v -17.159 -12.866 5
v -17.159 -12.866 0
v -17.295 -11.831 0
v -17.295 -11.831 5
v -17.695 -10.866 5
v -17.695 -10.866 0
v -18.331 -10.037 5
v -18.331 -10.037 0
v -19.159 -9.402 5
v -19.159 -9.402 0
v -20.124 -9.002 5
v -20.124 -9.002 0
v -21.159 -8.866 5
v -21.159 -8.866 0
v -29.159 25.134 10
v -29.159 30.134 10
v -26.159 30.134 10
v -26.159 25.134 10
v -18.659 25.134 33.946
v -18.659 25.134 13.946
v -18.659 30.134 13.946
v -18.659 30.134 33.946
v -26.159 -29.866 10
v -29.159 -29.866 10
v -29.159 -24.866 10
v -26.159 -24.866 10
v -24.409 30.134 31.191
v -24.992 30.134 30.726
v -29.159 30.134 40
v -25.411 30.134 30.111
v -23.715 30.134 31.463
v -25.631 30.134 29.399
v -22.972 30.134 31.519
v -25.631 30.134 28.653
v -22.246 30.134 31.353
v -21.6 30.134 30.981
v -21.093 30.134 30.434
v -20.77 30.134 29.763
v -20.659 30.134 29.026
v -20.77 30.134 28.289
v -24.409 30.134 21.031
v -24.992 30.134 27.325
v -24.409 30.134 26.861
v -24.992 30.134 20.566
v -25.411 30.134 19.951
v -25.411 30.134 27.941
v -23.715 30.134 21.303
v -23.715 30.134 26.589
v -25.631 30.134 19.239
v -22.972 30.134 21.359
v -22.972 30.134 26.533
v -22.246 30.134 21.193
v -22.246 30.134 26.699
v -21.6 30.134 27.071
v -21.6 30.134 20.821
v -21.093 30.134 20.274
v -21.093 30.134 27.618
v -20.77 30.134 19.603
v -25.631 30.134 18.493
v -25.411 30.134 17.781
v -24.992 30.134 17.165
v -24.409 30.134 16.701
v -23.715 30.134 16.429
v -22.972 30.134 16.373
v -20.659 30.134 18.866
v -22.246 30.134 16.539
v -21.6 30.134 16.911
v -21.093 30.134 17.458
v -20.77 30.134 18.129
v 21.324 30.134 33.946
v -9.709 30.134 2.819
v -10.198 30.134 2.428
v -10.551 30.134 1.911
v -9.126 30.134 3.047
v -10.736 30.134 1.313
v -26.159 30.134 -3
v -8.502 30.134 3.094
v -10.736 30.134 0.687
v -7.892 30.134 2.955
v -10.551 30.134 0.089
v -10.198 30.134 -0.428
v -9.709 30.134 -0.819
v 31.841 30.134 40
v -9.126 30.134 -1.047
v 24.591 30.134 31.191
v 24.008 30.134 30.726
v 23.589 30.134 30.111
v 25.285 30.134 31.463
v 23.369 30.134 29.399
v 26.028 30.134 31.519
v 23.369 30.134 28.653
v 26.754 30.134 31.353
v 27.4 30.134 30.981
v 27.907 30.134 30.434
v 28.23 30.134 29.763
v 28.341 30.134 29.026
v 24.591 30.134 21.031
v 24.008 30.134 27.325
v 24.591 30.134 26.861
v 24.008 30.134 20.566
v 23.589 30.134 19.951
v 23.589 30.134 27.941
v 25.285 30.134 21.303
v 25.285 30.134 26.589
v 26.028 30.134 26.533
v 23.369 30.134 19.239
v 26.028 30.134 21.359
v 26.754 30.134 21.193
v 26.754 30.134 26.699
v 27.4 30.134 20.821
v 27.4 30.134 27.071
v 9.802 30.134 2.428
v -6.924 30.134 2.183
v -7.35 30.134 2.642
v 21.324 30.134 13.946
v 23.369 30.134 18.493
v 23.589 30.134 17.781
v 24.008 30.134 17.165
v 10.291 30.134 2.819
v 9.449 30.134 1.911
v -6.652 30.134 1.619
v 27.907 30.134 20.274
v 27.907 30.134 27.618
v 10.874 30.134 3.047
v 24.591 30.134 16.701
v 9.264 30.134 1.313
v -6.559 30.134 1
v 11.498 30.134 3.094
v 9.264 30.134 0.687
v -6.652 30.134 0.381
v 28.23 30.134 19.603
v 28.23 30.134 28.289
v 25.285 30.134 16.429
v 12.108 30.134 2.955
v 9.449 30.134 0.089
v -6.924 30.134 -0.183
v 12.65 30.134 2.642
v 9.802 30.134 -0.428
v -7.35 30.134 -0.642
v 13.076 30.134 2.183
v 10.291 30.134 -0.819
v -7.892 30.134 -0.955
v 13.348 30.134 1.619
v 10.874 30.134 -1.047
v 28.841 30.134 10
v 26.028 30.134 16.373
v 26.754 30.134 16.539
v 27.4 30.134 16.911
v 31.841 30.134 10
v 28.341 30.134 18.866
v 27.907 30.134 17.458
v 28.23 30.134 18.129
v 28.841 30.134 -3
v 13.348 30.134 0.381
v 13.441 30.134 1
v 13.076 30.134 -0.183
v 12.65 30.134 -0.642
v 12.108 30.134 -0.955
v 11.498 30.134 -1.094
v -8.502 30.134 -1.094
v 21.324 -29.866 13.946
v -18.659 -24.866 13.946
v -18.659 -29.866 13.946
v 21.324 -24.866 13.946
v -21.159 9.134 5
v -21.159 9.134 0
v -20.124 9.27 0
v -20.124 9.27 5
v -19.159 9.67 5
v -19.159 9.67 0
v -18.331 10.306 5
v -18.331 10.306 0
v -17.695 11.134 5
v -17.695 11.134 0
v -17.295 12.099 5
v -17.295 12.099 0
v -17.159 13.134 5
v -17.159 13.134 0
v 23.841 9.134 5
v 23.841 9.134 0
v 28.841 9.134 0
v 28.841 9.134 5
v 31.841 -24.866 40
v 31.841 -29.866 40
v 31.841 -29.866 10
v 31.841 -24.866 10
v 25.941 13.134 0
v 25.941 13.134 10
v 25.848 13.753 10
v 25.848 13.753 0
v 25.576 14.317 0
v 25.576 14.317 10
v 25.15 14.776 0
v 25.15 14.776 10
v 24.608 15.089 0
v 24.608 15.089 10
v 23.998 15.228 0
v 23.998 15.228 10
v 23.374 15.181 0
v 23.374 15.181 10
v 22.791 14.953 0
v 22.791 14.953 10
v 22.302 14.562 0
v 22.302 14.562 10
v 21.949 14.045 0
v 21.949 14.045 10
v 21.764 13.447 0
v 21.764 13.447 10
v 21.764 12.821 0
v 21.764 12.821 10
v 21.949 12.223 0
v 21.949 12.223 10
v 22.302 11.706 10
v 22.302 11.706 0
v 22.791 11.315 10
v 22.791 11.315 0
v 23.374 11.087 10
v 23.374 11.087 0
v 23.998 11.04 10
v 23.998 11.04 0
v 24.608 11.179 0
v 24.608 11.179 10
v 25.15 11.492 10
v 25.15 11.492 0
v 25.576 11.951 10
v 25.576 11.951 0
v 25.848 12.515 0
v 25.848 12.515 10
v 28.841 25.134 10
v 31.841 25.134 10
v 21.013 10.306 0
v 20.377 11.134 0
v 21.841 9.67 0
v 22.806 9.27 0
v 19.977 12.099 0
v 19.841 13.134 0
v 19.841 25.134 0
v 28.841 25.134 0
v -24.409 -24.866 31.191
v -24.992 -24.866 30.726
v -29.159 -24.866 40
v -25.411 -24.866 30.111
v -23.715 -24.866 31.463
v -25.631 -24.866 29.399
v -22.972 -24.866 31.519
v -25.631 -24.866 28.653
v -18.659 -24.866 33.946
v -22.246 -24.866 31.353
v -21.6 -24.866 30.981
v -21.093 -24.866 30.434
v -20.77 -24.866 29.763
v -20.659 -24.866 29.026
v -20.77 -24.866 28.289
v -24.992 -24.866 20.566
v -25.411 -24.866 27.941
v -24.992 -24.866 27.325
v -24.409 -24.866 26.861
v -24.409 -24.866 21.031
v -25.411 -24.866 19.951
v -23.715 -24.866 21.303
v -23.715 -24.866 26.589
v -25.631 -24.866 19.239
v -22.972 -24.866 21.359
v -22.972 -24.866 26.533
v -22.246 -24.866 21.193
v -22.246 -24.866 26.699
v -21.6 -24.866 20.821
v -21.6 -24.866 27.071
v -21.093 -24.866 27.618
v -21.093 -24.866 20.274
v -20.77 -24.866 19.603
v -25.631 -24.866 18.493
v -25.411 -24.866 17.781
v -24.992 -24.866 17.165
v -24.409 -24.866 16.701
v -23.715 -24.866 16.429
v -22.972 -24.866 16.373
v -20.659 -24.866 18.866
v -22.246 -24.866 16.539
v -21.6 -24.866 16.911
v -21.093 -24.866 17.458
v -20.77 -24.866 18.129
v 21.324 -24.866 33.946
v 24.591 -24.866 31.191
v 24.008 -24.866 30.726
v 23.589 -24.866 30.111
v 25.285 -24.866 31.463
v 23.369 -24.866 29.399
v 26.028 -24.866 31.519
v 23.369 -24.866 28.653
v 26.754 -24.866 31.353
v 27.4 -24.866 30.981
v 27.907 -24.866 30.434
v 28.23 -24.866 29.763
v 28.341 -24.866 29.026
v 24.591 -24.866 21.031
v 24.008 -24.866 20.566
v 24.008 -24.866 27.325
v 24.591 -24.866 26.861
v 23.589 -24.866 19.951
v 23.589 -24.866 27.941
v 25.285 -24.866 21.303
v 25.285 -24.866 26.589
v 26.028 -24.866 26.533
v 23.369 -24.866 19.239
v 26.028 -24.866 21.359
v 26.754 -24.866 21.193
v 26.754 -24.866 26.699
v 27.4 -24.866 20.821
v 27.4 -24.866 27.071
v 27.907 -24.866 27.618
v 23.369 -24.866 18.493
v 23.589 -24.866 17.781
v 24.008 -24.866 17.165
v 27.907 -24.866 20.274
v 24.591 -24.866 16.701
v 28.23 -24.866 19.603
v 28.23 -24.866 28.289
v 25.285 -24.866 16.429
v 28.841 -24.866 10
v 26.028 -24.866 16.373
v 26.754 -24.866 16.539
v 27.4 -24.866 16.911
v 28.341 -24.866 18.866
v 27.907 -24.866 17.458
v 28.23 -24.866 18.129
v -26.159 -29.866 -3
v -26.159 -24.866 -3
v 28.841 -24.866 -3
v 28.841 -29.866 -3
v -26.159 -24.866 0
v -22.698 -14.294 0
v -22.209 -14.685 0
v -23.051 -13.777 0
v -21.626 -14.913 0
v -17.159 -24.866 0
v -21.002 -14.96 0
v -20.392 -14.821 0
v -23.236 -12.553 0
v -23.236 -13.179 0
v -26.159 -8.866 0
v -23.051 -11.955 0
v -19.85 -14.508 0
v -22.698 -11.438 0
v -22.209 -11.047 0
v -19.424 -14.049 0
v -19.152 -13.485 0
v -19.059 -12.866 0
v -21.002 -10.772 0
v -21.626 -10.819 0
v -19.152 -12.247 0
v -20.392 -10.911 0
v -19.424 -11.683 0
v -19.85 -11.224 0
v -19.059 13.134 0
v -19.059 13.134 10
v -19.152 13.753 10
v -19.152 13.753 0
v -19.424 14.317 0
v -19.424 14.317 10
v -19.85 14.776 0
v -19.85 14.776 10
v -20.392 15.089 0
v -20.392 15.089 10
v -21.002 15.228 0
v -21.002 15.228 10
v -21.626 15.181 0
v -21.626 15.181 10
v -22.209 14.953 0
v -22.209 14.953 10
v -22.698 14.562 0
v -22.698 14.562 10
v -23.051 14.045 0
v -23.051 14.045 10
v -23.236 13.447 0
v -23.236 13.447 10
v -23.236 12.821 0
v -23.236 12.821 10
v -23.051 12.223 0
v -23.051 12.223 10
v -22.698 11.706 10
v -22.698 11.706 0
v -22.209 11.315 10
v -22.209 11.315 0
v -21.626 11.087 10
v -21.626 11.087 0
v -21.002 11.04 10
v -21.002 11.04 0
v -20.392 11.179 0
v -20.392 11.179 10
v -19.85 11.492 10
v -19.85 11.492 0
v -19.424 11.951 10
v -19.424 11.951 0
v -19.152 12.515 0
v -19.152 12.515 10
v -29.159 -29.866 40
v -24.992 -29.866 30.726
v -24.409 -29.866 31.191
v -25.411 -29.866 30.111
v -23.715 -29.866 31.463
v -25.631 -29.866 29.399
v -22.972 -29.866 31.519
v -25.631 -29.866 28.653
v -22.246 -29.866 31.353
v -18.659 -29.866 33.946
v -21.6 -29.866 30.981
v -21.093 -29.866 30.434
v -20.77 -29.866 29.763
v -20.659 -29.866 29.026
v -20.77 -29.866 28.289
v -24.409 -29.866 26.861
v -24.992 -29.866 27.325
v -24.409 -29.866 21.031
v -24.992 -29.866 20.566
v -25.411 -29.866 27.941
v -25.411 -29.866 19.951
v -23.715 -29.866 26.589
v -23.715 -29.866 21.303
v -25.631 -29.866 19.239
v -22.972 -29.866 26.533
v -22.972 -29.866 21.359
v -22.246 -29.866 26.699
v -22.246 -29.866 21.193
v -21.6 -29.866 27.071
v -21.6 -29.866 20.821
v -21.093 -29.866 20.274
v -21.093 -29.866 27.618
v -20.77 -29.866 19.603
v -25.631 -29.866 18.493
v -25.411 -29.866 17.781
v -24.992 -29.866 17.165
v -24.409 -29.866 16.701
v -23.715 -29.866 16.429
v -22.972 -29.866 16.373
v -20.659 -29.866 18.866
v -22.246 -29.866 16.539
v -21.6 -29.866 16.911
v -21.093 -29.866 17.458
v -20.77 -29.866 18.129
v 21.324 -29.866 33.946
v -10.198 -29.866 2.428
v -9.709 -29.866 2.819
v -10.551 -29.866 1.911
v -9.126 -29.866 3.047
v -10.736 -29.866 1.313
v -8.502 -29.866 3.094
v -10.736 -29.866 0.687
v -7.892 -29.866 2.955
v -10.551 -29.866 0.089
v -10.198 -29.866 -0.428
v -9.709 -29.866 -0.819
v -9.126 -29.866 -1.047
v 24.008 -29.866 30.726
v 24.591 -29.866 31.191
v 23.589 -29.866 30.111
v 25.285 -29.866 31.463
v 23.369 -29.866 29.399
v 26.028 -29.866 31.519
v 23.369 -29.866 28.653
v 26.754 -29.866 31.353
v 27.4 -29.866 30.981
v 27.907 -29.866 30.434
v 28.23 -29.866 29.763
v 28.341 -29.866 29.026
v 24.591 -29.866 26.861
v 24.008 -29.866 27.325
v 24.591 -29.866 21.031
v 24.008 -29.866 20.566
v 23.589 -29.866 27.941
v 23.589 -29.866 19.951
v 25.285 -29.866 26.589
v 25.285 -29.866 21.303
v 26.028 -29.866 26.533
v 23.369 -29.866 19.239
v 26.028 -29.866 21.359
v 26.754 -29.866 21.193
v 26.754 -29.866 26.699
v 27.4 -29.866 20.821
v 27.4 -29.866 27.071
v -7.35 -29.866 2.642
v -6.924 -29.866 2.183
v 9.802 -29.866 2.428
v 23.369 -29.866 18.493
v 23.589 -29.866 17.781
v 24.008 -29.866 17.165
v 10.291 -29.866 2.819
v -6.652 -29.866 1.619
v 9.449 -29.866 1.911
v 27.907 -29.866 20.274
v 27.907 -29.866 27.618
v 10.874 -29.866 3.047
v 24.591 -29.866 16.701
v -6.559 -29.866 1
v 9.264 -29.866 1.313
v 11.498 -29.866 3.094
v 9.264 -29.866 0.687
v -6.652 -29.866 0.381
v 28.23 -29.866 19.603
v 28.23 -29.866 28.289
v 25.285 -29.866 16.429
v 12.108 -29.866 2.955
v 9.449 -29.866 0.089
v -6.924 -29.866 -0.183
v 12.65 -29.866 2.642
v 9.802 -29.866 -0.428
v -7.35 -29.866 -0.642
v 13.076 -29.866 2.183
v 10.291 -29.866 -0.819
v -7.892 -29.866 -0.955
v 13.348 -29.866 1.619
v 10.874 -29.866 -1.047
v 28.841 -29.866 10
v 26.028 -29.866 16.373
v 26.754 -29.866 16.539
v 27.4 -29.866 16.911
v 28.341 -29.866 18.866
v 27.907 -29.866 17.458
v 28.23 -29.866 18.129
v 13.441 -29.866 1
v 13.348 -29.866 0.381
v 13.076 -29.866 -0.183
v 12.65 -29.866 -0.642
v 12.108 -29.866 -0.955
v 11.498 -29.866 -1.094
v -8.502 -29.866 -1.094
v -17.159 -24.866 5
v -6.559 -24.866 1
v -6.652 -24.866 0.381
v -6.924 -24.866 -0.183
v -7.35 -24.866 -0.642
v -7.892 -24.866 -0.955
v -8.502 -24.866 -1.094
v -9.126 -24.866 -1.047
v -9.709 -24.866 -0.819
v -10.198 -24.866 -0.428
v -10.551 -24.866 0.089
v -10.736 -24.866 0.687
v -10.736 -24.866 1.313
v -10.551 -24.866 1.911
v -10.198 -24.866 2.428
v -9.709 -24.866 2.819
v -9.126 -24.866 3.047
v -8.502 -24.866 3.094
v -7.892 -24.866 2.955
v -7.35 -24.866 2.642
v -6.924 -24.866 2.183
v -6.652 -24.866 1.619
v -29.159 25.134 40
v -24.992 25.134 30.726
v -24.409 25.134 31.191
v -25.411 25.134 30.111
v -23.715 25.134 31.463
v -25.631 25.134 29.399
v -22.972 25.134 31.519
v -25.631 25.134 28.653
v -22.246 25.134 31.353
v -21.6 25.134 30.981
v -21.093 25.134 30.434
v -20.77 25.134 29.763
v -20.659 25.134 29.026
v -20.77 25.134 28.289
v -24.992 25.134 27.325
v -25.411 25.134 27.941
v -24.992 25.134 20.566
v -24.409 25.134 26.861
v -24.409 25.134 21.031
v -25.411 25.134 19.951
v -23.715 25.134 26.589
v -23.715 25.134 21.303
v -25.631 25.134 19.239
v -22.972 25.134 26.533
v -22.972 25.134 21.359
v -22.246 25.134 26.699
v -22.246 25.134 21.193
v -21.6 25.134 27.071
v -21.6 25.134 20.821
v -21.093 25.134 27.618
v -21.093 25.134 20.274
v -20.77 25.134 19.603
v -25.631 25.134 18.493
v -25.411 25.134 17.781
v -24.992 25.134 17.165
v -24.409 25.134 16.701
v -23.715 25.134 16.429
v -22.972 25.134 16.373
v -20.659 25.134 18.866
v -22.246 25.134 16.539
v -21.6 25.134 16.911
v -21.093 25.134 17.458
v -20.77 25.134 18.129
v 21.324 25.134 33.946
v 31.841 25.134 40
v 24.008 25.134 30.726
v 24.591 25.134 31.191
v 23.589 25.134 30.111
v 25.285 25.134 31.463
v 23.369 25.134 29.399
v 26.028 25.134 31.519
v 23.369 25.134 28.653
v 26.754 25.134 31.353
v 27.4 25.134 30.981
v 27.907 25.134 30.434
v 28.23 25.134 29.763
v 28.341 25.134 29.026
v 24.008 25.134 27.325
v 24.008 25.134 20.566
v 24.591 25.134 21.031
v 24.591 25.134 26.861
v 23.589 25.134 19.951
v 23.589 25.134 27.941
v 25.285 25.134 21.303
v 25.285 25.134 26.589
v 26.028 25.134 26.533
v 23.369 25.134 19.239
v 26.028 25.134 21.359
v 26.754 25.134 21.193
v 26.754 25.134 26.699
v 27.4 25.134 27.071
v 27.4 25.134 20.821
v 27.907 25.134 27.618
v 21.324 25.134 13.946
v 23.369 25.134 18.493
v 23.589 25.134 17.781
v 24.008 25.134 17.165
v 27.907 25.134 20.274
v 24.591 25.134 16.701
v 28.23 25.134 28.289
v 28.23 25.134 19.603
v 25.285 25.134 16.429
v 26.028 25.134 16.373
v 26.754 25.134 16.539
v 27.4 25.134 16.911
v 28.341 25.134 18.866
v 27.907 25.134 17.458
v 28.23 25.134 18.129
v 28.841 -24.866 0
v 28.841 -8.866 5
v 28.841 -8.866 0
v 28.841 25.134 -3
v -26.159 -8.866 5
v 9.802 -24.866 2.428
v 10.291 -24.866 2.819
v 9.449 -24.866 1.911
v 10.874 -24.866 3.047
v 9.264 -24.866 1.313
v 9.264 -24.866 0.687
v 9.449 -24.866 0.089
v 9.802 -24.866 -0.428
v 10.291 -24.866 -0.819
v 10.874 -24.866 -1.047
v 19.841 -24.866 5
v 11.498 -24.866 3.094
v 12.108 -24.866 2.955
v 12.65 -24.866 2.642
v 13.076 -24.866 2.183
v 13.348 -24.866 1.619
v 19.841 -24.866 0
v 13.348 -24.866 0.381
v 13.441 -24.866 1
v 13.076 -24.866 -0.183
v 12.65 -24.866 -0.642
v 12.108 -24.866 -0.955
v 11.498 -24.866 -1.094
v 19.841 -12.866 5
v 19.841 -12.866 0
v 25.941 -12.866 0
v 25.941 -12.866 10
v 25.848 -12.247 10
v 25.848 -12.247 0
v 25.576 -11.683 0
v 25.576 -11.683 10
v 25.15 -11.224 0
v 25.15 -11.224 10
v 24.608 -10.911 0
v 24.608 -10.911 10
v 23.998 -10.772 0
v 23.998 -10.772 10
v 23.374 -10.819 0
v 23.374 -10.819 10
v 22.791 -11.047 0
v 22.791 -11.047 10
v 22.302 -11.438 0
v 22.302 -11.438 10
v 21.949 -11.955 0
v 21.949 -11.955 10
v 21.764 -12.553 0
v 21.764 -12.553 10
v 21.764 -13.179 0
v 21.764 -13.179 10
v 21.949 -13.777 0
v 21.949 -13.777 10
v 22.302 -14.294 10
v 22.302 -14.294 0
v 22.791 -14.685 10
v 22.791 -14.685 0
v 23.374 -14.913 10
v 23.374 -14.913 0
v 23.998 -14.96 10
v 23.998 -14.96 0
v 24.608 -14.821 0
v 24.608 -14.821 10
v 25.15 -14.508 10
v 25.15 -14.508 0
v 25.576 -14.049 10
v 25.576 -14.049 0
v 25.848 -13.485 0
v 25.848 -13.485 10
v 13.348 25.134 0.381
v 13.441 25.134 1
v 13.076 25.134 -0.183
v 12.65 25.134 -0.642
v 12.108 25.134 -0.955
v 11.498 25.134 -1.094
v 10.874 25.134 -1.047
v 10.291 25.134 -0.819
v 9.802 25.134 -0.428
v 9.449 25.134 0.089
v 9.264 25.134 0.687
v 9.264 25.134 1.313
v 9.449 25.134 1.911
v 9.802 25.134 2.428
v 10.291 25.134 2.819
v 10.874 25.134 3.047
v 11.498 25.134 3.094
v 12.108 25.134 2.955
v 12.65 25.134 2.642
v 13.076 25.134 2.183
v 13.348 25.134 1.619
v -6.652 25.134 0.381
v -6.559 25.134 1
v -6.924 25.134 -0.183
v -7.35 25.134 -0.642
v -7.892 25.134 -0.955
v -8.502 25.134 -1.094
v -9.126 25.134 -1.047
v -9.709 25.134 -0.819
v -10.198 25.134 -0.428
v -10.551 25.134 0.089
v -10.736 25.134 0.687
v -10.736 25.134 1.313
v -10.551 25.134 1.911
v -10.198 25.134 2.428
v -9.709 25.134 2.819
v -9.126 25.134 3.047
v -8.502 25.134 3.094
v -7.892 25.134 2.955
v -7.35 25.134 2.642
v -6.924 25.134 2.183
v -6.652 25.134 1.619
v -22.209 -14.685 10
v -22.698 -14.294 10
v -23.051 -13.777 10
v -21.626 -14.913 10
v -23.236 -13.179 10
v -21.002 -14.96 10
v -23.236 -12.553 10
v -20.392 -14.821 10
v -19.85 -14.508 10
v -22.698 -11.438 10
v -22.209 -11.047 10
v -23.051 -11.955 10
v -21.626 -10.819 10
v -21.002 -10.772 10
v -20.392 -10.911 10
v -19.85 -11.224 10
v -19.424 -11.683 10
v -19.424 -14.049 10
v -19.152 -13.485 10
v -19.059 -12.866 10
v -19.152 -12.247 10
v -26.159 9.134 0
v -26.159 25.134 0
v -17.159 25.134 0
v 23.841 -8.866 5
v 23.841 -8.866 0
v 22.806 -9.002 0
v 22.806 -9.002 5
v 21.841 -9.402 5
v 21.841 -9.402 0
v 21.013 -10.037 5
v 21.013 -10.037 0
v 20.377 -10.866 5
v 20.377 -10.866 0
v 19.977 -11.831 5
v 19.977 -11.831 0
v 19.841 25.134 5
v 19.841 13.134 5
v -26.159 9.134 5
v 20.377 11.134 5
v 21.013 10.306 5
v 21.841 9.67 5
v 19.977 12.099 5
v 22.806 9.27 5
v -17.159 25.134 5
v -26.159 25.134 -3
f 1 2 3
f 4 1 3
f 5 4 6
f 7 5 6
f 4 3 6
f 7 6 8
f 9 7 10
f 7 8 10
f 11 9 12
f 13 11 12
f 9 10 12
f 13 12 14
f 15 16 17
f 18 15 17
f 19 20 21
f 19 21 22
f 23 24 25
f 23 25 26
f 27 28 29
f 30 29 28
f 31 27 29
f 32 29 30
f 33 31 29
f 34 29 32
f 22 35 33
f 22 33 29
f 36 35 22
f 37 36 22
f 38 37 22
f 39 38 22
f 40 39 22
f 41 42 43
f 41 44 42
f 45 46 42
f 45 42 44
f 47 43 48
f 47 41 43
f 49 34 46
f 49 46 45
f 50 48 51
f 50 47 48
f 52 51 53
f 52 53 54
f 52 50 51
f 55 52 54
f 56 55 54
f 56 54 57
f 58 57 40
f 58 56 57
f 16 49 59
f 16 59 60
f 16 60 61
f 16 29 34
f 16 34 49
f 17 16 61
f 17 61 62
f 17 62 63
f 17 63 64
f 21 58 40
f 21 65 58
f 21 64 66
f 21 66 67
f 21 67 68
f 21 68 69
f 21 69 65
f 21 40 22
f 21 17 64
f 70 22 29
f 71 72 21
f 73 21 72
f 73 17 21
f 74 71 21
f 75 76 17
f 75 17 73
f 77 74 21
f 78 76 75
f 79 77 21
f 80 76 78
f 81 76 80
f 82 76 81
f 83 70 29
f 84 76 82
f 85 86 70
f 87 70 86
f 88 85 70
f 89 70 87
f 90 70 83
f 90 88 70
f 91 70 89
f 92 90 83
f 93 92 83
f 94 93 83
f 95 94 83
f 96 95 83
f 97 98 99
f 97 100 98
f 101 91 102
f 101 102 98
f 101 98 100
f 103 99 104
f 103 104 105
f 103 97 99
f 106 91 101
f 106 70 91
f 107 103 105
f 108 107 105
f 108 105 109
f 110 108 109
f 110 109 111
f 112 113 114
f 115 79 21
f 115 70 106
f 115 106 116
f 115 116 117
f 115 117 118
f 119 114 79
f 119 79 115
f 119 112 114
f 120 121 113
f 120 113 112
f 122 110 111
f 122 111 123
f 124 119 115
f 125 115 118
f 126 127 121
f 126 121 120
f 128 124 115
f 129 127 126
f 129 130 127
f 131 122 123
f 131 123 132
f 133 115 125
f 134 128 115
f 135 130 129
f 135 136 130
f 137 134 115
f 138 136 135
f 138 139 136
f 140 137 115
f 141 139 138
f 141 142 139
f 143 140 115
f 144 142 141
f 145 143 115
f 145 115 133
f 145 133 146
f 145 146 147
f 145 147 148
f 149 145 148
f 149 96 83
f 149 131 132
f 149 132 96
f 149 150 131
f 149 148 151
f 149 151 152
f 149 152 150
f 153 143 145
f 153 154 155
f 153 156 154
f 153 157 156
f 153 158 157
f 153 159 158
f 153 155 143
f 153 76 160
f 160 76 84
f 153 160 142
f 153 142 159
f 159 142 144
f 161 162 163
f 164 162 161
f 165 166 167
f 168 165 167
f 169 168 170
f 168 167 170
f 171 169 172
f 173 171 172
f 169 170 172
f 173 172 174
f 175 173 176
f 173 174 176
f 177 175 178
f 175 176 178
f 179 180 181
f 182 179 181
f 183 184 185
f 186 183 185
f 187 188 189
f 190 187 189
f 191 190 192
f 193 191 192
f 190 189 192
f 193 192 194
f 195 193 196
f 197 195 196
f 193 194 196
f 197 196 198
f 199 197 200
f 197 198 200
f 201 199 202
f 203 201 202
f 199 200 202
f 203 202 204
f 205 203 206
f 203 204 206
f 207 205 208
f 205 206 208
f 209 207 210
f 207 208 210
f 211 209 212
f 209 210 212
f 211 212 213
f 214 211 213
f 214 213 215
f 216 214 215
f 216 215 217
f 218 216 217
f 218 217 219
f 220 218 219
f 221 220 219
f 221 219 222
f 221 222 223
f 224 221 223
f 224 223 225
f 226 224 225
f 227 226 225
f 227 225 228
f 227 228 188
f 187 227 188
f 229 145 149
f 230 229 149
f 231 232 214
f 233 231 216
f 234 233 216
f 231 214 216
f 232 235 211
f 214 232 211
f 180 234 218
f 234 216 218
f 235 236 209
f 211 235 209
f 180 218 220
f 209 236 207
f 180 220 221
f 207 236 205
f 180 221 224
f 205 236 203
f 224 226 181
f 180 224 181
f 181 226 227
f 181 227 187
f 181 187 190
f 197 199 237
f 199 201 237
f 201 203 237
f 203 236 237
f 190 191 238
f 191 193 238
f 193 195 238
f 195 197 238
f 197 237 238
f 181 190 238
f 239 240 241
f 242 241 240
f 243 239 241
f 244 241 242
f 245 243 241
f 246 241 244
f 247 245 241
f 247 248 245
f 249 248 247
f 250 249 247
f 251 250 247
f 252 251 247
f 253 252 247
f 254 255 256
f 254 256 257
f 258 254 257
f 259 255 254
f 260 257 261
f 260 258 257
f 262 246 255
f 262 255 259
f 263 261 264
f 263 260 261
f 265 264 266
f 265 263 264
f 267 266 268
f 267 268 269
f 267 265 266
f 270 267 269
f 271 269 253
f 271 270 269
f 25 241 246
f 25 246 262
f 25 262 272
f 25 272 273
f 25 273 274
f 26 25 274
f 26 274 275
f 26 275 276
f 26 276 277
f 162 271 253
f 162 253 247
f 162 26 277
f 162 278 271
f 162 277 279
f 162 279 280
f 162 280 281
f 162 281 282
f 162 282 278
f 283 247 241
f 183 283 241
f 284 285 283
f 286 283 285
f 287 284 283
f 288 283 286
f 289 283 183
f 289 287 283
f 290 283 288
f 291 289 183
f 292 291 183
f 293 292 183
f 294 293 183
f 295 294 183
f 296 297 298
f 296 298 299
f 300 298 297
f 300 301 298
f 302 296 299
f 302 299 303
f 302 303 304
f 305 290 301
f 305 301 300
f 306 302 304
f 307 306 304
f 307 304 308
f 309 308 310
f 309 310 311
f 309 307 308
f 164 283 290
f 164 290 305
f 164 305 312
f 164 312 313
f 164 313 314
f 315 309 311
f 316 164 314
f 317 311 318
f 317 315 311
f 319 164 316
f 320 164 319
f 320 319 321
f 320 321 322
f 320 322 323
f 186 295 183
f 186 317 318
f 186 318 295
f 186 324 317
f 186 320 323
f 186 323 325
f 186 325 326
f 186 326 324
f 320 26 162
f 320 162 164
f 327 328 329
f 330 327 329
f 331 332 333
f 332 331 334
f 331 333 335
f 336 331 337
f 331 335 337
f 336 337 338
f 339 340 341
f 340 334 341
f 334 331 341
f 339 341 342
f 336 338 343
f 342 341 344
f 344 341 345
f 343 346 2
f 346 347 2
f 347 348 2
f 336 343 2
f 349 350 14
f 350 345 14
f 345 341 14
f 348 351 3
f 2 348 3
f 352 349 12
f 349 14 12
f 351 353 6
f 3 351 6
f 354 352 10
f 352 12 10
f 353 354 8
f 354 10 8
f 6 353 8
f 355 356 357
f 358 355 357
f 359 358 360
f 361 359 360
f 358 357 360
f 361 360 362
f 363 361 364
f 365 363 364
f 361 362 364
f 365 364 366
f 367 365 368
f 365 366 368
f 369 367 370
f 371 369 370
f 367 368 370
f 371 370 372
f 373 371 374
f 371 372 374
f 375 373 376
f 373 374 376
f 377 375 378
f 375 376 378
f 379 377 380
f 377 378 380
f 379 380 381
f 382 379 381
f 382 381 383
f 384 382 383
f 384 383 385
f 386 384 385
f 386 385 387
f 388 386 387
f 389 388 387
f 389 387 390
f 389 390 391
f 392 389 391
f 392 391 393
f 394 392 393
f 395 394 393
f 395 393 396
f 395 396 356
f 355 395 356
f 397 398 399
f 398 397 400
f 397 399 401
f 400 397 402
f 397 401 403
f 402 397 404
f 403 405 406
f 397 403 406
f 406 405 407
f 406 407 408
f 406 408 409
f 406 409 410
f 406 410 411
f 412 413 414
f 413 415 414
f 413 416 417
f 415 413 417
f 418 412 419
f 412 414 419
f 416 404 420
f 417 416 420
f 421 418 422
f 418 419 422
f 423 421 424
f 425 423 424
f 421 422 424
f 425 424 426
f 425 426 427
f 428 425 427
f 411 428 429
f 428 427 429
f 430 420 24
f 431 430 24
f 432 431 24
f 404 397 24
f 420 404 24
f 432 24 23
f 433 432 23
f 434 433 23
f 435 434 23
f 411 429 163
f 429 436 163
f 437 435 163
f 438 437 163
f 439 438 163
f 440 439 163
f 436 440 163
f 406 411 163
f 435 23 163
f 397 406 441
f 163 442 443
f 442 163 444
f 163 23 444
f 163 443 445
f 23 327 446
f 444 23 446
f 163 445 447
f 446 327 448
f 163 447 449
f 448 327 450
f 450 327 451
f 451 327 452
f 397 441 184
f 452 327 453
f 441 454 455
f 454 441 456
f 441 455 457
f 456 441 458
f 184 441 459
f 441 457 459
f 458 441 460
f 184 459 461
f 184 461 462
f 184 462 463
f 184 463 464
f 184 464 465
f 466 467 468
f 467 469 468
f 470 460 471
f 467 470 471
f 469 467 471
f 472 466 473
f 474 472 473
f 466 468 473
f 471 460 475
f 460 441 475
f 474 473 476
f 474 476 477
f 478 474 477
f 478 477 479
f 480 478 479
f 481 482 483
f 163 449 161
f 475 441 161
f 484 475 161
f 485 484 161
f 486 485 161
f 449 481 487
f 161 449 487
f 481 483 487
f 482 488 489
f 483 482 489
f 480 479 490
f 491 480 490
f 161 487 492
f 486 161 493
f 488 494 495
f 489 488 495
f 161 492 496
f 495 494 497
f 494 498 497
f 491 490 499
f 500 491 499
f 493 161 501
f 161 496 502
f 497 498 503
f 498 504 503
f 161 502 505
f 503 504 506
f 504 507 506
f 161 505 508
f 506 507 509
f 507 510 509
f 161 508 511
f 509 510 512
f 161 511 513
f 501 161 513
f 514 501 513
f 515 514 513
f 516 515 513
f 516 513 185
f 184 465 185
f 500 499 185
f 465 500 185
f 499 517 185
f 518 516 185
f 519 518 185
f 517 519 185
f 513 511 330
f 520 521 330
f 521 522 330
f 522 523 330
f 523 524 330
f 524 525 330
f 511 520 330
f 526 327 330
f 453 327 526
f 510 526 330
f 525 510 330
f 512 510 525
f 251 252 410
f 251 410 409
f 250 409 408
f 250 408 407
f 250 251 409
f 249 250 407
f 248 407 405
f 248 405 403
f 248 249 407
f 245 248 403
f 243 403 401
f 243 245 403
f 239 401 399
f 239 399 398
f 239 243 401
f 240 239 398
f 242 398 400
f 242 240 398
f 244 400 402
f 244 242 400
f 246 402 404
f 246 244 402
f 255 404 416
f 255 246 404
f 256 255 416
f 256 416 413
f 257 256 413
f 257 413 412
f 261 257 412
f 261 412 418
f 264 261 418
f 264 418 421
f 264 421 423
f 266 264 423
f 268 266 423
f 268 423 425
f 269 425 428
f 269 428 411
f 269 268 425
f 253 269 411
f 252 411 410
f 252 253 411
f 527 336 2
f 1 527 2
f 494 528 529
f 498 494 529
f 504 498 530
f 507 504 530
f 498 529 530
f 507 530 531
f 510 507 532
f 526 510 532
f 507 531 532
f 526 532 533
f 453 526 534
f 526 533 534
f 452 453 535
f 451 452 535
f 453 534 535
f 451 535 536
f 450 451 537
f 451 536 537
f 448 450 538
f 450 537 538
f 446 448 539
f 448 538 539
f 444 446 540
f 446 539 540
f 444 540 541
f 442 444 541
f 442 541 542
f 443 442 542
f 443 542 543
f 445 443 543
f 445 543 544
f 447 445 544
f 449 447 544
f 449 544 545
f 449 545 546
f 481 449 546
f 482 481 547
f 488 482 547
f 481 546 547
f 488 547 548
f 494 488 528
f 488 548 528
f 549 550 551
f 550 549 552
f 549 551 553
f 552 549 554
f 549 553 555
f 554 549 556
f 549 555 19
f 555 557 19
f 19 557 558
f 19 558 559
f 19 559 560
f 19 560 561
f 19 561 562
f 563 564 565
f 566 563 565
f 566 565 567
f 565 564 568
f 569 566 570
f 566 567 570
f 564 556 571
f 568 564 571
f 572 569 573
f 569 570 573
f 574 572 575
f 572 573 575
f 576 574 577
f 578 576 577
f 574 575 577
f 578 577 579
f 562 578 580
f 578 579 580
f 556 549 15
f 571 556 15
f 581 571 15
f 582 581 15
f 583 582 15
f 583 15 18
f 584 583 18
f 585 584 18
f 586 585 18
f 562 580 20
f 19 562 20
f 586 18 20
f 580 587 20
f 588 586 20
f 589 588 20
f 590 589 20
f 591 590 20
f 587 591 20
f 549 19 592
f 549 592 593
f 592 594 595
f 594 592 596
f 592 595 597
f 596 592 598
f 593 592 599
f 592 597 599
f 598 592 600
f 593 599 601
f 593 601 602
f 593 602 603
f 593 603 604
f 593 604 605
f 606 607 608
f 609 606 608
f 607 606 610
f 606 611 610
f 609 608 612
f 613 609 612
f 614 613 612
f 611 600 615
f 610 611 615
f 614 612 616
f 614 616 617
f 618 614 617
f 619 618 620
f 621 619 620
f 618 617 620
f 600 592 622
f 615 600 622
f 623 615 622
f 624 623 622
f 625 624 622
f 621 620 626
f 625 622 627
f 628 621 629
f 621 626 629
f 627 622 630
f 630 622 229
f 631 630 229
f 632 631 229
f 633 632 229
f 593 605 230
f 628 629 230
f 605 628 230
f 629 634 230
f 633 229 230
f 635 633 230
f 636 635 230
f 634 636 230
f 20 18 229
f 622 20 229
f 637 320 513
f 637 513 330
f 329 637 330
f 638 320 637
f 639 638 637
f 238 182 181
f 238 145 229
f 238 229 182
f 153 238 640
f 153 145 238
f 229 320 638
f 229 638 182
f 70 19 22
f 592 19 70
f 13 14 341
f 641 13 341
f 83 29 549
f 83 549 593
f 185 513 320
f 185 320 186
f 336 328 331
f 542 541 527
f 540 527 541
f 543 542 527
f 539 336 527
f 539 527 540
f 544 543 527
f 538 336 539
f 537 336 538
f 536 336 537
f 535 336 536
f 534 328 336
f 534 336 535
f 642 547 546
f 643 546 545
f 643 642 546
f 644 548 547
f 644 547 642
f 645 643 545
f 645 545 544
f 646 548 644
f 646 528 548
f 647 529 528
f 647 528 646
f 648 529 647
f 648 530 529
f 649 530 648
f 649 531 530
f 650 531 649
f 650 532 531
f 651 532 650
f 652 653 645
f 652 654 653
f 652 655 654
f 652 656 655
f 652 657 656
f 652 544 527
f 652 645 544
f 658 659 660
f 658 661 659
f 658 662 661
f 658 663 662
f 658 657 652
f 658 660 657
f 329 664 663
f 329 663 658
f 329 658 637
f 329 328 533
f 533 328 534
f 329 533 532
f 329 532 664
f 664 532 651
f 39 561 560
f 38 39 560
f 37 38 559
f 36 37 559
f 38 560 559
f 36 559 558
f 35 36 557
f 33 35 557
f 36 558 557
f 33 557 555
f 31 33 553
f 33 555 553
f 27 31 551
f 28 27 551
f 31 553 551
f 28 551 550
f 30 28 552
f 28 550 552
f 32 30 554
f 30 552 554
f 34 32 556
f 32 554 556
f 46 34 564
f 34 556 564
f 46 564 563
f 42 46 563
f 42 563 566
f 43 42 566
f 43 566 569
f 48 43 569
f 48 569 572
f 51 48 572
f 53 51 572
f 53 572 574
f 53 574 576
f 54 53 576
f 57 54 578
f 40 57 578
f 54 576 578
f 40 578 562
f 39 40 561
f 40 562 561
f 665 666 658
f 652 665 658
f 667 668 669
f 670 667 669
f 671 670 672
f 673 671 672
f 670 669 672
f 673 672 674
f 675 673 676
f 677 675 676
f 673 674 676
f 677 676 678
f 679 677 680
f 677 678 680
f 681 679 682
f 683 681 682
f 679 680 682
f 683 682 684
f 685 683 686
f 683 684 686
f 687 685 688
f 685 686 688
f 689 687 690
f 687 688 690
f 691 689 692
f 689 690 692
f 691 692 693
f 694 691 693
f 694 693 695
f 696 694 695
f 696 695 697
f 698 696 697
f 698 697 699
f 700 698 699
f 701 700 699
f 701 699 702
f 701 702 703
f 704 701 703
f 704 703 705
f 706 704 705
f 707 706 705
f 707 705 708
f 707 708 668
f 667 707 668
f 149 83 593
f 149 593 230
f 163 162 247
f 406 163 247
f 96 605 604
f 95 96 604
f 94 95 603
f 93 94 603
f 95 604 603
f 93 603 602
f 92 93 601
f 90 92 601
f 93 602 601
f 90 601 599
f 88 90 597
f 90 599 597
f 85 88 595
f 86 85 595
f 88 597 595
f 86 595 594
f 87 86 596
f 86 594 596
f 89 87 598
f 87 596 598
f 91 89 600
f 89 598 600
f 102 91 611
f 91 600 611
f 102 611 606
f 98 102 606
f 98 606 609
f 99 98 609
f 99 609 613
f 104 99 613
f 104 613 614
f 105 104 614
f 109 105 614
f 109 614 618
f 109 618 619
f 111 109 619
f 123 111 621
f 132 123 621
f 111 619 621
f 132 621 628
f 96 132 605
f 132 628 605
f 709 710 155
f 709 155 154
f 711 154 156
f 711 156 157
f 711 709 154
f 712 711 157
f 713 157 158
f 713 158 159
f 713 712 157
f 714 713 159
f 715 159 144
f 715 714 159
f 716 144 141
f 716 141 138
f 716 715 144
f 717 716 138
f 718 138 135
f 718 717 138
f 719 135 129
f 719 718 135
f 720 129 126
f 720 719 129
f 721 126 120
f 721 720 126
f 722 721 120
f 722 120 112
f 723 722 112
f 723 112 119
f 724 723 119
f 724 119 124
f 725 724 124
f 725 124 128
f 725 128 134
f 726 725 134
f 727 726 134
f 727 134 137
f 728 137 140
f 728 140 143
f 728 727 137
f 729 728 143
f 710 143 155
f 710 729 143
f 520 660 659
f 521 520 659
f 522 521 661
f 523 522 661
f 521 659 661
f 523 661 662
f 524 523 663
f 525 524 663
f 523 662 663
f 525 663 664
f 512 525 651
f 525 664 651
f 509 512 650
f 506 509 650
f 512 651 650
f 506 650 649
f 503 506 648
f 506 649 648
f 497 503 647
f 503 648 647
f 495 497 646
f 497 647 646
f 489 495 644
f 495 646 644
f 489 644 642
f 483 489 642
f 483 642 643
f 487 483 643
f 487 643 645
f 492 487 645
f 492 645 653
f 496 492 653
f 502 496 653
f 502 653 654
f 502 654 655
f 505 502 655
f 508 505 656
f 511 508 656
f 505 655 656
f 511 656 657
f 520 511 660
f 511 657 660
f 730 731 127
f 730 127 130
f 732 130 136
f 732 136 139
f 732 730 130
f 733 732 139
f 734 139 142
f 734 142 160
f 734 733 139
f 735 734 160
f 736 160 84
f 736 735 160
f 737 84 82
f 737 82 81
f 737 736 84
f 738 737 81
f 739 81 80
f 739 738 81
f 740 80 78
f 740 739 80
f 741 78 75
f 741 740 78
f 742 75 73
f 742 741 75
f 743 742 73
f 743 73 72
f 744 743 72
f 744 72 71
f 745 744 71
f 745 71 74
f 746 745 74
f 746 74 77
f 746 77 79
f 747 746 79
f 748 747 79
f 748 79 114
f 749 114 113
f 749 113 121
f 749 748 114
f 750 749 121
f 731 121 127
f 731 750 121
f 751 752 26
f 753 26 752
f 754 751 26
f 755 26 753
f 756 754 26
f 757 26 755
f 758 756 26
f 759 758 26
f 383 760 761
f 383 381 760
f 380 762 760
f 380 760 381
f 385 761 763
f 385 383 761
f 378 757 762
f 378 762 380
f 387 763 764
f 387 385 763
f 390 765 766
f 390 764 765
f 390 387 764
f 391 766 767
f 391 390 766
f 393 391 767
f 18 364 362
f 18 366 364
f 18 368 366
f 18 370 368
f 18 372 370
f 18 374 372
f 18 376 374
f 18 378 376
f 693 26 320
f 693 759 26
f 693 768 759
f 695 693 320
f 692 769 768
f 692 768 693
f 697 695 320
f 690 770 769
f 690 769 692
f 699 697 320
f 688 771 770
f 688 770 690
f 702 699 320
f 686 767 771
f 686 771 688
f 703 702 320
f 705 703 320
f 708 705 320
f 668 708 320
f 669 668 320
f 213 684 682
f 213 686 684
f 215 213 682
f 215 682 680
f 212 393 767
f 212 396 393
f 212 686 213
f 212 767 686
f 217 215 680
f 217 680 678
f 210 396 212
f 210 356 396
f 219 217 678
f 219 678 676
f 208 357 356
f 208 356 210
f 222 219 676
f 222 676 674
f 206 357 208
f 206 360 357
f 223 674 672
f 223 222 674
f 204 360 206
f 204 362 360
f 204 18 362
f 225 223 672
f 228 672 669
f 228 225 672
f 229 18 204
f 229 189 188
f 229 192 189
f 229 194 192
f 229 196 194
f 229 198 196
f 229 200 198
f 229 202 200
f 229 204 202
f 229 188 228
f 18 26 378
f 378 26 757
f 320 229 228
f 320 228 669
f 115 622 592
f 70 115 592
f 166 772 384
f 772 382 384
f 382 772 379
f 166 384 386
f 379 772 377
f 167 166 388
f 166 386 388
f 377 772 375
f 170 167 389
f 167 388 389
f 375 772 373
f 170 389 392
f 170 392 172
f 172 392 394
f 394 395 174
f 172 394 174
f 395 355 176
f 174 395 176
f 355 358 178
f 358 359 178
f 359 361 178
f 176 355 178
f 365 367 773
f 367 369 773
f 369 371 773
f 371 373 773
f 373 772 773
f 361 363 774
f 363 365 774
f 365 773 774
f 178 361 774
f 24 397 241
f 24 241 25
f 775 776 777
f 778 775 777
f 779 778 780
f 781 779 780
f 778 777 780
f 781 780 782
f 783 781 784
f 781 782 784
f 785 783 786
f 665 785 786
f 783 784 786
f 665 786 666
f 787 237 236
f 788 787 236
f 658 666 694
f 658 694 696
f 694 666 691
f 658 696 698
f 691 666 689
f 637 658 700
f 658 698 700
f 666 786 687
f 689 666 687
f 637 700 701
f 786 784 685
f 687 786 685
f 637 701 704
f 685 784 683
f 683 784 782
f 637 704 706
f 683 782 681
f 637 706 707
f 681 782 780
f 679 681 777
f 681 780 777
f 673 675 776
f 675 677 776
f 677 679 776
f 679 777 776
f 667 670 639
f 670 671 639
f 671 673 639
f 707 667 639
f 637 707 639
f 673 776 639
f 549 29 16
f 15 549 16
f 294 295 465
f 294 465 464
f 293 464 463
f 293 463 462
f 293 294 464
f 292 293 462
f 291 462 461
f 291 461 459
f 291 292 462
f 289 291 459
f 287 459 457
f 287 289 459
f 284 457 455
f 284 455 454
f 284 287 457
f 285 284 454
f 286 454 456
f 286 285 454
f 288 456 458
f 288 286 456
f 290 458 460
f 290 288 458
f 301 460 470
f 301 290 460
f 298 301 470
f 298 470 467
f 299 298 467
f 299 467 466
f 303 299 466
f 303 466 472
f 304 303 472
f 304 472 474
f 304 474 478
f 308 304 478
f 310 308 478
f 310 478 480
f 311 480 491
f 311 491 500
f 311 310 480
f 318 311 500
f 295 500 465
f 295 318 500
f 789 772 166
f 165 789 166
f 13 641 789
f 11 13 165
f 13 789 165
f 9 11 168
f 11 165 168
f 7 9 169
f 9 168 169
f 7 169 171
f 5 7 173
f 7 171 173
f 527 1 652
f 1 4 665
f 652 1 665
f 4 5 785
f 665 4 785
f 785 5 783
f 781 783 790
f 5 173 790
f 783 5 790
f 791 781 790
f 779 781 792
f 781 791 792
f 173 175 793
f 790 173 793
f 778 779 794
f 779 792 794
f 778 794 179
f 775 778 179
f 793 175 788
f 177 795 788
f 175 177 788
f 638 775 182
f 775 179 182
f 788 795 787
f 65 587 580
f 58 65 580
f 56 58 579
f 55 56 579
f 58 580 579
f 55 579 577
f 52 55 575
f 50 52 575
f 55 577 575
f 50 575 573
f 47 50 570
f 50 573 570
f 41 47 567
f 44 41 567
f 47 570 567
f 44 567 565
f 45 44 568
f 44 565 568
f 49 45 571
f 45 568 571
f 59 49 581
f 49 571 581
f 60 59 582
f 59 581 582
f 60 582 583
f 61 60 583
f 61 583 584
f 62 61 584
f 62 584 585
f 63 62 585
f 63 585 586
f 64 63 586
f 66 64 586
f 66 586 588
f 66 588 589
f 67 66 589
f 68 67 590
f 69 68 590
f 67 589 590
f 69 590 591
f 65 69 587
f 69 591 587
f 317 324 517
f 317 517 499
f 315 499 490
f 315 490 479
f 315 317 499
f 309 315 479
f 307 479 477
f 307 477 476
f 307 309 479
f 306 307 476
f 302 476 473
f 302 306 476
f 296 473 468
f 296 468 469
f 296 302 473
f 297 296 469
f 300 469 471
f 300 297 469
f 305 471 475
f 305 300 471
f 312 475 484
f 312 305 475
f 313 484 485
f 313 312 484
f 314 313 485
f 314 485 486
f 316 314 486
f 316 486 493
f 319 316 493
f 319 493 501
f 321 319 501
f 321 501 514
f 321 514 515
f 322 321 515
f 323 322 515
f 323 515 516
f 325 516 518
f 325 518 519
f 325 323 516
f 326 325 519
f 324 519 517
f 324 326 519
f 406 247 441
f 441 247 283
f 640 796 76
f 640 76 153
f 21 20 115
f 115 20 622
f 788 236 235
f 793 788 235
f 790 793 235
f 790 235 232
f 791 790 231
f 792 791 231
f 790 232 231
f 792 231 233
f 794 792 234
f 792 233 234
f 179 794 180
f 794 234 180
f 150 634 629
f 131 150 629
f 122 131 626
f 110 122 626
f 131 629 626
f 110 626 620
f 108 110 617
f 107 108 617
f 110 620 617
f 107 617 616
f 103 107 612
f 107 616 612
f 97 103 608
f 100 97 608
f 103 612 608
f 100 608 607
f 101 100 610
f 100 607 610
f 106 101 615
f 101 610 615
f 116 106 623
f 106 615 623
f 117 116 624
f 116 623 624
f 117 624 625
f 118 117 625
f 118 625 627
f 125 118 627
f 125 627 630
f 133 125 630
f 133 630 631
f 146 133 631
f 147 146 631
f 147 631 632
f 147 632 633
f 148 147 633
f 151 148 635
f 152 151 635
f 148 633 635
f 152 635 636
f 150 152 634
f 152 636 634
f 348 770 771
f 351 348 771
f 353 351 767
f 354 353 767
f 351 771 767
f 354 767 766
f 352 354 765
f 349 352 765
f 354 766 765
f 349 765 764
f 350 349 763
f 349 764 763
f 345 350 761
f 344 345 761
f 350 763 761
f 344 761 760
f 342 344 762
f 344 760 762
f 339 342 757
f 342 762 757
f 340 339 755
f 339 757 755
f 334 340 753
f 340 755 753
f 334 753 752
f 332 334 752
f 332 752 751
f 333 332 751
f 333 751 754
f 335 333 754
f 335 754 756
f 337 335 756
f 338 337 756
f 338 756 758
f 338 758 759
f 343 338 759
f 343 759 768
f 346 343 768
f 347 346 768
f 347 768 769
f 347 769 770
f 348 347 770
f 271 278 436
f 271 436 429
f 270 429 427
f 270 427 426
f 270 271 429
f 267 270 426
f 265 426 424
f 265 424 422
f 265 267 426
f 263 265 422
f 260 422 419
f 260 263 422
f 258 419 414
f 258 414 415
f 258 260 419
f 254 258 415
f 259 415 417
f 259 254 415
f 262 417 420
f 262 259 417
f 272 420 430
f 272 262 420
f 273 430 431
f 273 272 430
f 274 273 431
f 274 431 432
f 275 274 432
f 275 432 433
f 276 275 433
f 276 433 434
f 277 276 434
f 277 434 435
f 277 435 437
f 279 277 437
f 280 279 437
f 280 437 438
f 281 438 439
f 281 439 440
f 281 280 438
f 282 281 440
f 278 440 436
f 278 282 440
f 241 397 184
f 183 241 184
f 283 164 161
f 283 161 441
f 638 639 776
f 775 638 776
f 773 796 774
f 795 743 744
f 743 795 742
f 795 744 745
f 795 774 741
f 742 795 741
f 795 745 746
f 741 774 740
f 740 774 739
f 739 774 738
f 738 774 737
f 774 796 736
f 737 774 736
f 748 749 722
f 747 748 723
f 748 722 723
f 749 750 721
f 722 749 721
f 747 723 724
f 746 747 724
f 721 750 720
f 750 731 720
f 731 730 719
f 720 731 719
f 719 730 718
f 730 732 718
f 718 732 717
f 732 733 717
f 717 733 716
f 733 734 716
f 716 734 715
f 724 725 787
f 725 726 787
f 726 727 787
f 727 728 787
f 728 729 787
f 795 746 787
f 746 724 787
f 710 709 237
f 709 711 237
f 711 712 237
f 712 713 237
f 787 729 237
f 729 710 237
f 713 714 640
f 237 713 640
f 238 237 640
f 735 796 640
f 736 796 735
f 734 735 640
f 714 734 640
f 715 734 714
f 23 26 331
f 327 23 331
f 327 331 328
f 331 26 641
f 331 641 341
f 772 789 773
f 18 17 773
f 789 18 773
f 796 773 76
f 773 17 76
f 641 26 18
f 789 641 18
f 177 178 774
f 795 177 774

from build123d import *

# Parameters (mm, degrees)
BOSS_EXTRUDE1_DEPTH   = 5
BOSS_EXTRUDE1_2_DEPTH = 5
BOSS_EXTRUDE1_3_DEPTH = 5
BOSS_EXTRUDE1_4_DEPTH = 5
SKETCH2_W             = 55
SKETCH2_H             = 50
BOSS_EXTRUDE2_DEPTH   = 5
SKETCH3_W             = 55
SKETCH3_H             = 13
SKETCH3_R             = 2.1
BOSS_EXTRUDE3_DEPTH   = 5
SKETCH4_W             = 61
SKETCH4_H             = 30
BOSS_EXTRUDE4_DEPTH   = 5
SKETCH5_R             = 2.5
SKETCH5_W             = 39.983210939
SKETCH5_H             = 20
CUT_EXTRUDE3_DEPTH    = 5
SKETCH7_R             = 2.1
CUT_EXTRUDE4_DEPTH    = 14


with BuildPart() as part:
    # Sketch1 → Boss-Extrude1 (new body)
    with BuildSketch(Plane.XY):
        with BuildLine():
            Line((23.840984083, 9.134098408), (28.840984083, 9.134098408))
            Line((28.840984083, 9.134098408), (28.840984083, 25.134098408))
            Line((28.840984083, 25.134098408), (19.840984083, 25.134098408))
            Line((19.840984083, 25.134098408), (19.840984083, 13.134098408))
            ThreePointArc((19.840984083, 13.134098408), (21.012556959, 10.305671284), (23.840984083, 9.134098408))
        make_face()
    extrude(amount=BOSS_EXTRUDE1_DEPTH)



with BuildPart() as body_2:
    # Sketch1 → Boss-Extrude1 2 (new body)
    with BuildSketch(Plane.XY):
        with BuildLine():
            Line((-26.159015917, 9.134098408), (-21.159015917, 9.134098408))
            ThreePointArc((-21.159015917, 9.134098408), (-18.330588792, 10.305671284), (-17.159015917, 13.134098408))
            Line((-17.159015917, 13.134098408), (-17.159015917, 25.134098408))
            Line((-17.159015917, 25.134098408), (-26.159015917, 25.134098408))
            Line((-26.159015917, 25.134098408), (-26.159015917, 9.134098408))
        make_face()
    extrude(amount=BOSS_EXTRUDE1_2_DEPTH)


with BuildPart() as body_3:
    # Sketch1 → Boss-Extrude1 3 (new body)
    with BuildSketch(Plane.XY):
        with BuildLine():
            Line((28.840984083, -8.865901592), (23.840984083, -8.865901592))
            ThreePointArc((23.840984083, -8.865901592), (21.012556959, -10.037474467), (19.840984083, -12.865901592))
            Line((19.840984083, -12.865901592), (19.840984083, -24.865901592))
            Line((19.840984083, -24.865901592), (28.840984083, -24.865901592))
            Line((28.840984083, -24.865901592), (28.840984083, -8.865901592))
        make_face()
    extrude(amount=BOSS_EXTRUDE1_3_DEPTH)


with BuildPart() as body_4:
    # Sketch1 → Boss-Extrude1 4 (new body)
    with BuildSketch(Plane.XY):
        with BuildLine():
            Line((-17.159015917, -24.865901592), (-17.159015917, -12.865901592))
            ThreePointArc((-17.159015917, -12.865901592), (-18.330588792, -10.037474467), (-21.159015917, -8.865901592))
            Line((-21.159015917, -8.865901592), (-26.159015917, -8.865901592))
            Line((-26.159015917, -8.865901592), (-26.159015917, -24.865901592))
            Line((-26.159015917, -24.865901592), (-17.159015917, -24.865901592))
        make_face()
    extrude(amount=BOSS_EXTRUDE1_4_DEPTH)


with BuildPart() as part_1:
    add(part.part)

    add(body_2.part)  # Boss-Extrude2 merges body 2

    add(body_3.part)  # Boss-Extrude2 merges body 3

    add(body_4.part)  # Boss-Extrude2 merges body 4
    # Sketch2 → Boss-Extrude2 (add)
    with BuildSketch(Plane.XY.offset(5)):
        with Locations((1.340984083, 0.134098408)):
            Rectangle(SKETCH2_W, SKETCH2_H)
    extrude(amount=BOSS_EXTRUDE2_DEPTH)

    # Sketch3 → Boss-Extrude3 (add)
    with BuildSketch(Plane(origin=(0, 25.134098408, 0), x_dir=(1, 0, 0), z_dir=(0, 1, 0))):
        with Locations((1.340984083, -3.5)):
            Rectangle(SKETCH3_W, SKETCH3_H)
        with Locations((-8.659015917, -1)):
            Circle(SKETCH3_R, mode=Mode.SUBTRACT)
        with Locations((11.340984083, -1)):
            Circle(SKETCH3_R, mode=Mode.SUBTRACT)
    boss_extrude3 = extrude(amount=BOSS_EXTRUDE3_DEPTH)

    # Mirror1: Boss-Extrude3 across plane
    add(boss_extrude3.mirror(Plane(origin=(0, 0.134098408, 0), x_dir=(0, 0, 1), z_dir=(0, -1, 0))))

    # Sketch4 → Boss-Extrude4 (add)
    with BuildSketch(Plane(origin=(0, 30.134098408, 0), x_dir=(1, 0, 0), z_dir=(0, 1, 0))):
        with Locations((1.340984083, -25)):
            Rectangle(SKETCH4_W, SKETCH4_H)
    boss_extrude4 = extrude(amount=-BOSS_EXTRUDE4_DEPTH)

    # Mirror2: Boss-Extrude4 across plane
    add(boss_extrude4.mirror(Plane(origin=(0, 0.134098408, 0), x_dir=(0, 0, 1), z_dir=(0, -1, 0))))

    # Sketch5 → Cut-Extrude3 (cut)
    with BuildSketch(Plane.XZ.offset(-25.134098408)):
        with Locations((-23.159015917, 29.025922811)):
            Circle(SKETCH5_R)
        with Locations((-23.159015917, 18.865922811)):
            Circle(SKETCH5_R)
        with Locations((25.840984083, 29.025922811)):
            Circle(SKETCH5_R)
        with Locations((25.840984083, 18.865922811)):
            Circle(SKETCH5_R)
        with Locations((1.332589552, 23.945922811)):
            Rectangle(SKETCH5_W, SKETCH5_H)
    cut_extrude3 = extrude(amount=-CUT_EXTRUDE3_DEPTH, mode=Mode.SUBTRACT)

    # Sketch7 → Cut-Extrude4 (cut, through all)
    with BuildSketch(Plane.XY.offset(10)):
        with Locations((23.840984083, -12.865901592)):
            Circle(SKETCH7_R)
        with Locations((-21.159015917, -12.865901592)):
            Circle(SKETCH7_R)
        with Locations((23.840984083, 13.134098408)):
            Circle(SKETCH7_R)
        with Locations((-21.159015917, 13.134098408)):
            Circle(SKETCH7_R)
    extrude(amount=-CUT_EXTRUDE4_DEPTH, mode=Mode.SUBTRACT)

    # Mirror3: Cut-Extrude3 across plane
    add(cut_extrude3.mirror(Plane(origin=(0, 0.134098408, 0), x_dir=(0, 0, 1), z_dir=(0, -1, 0))), mode=Mode.SUBTRACT)


solid = part_1.part
